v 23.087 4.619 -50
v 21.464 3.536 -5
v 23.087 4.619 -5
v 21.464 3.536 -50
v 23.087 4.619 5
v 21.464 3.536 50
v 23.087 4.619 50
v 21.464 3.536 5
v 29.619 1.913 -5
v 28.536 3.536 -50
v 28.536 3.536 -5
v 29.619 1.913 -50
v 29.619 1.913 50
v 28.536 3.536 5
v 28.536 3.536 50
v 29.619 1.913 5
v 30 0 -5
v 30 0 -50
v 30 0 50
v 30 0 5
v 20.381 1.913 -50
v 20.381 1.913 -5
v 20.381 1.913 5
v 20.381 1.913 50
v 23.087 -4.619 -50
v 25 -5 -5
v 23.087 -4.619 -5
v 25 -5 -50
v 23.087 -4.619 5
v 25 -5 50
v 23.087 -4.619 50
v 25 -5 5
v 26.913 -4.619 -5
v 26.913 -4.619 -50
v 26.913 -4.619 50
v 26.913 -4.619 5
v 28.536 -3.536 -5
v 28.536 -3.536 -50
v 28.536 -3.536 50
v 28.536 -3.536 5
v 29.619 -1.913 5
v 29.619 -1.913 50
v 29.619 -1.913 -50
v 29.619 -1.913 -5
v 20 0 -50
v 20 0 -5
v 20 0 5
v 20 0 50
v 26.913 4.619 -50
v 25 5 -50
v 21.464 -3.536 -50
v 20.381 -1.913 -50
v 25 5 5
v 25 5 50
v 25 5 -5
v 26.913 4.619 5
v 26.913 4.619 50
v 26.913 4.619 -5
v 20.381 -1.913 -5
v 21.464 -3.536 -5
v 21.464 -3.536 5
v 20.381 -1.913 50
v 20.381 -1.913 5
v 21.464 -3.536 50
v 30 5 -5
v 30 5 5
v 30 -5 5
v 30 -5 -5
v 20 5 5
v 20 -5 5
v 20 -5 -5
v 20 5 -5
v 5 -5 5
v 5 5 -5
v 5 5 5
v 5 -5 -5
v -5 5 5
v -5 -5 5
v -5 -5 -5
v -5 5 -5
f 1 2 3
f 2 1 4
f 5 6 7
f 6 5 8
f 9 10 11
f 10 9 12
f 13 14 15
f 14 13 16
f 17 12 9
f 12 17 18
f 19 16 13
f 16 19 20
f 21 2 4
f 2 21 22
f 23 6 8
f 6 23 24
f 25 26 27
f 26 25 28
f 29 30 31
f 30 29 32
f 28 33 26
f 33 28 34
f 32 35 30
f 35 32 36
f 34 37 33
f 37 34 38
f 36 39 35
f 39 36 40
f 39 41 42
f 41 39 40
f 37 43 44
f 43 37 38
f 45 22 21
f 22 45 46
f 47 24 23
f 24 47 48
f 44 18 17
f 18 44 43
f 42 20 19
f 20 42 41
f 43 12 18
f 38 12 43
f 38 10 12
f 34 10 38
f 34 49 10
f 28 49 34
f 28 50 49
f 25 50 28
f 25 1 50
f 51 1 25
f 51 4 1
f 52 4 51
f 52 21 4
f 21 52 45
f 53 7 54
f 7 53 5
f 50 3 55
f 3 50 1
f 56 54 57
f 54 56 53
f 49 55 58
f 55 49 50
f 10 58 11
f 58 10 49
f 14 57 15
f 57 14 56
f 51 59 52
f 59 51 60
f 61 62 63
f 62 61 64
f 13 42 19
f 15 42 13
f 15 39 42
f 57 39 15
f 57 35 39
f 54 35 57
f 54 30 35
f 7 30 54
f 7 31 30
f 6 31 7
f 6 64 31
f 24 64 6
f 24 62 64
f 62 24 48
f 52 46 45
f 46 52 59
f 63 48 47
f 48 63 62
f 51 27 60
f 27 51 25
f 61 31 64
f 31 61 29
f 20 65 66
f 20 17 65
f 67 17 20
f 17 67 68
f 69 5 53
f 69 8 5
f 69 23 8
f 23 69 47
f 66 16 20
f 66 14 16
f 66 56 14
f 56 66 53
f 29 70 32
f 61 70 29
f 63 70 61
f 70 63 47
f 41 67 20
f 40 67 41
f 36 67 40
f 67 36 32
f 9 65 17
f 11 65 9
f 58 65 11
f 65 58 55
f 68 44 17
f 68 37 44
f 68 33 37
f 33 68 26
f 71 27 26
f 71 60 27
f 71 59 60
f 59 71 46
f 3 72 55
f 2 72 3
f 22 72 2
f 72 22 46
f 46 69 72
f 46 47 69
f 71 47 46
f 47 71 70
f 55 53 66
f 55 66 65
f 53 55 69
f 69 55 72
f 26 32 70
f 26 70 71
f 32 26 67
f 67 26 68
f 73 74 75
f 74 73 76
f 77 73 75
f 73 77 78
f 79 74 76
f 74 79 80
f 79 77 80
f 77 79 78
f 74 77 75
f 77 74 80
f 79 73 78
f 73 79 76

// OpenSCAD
module hole(size) {
	cylinder(r = size, h = 100, center = true); 
	cube(size=[10, 10, 10], center=true); 
} 

translate([25, 0, 0]) {
	hole(5); 
} 

cube(size=[10, 10, 10], center=true);
